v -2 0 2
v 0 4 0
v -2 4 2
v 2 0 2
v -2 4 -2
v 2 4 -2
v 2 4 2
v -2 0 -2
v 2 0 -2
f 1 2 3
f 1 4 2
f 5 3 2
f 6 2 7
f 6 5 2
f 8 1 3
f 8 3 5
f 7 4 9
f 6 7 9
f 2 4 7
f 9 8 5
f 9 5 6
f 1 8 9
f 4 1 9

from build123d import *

# Parameters (mm, degrees)
SKETCH2_W           = 4
SKETCH2_H           = 4
BOSS_EXTRUDE1_DEPTH = 4
CUT_EXTRUDE1_DEPTH  = 4


with BuildPart() as part:
    # Sketch2 → Boss-Extrude1 (new body)
    with BuildSketch(Plane(origin=(0, 0, 0), x_dir=(1, 0, 0), z_dir=(0, 1, 0))):
        Rectangle(SKETCH2_W, SKETCH2_H)
    extrude(amount=BOSS_EXTRUDE1_DEPTH)

    # 3DSketch1 → Cut-Extrude1 (cut, along a direction that is not the sketch's normal)
    with BuildSketch(Plane(origin=(2, 0, 2), x_dir=(-0.4082482904638631, 0.8164965809277261, -0.4082482904638631), z_dir=(0, 0.447213595499958, 0.894427190999916))):
        Polygon((0, 0), (4.898979486, 0), (1.632993162, 3.651483717), align=None)
    extrude(amount=CUT_EXTRUDE1_DEPTH, dir=(0, 1, 0), mode=Mode.SUBTRACT)


solid = part.part
